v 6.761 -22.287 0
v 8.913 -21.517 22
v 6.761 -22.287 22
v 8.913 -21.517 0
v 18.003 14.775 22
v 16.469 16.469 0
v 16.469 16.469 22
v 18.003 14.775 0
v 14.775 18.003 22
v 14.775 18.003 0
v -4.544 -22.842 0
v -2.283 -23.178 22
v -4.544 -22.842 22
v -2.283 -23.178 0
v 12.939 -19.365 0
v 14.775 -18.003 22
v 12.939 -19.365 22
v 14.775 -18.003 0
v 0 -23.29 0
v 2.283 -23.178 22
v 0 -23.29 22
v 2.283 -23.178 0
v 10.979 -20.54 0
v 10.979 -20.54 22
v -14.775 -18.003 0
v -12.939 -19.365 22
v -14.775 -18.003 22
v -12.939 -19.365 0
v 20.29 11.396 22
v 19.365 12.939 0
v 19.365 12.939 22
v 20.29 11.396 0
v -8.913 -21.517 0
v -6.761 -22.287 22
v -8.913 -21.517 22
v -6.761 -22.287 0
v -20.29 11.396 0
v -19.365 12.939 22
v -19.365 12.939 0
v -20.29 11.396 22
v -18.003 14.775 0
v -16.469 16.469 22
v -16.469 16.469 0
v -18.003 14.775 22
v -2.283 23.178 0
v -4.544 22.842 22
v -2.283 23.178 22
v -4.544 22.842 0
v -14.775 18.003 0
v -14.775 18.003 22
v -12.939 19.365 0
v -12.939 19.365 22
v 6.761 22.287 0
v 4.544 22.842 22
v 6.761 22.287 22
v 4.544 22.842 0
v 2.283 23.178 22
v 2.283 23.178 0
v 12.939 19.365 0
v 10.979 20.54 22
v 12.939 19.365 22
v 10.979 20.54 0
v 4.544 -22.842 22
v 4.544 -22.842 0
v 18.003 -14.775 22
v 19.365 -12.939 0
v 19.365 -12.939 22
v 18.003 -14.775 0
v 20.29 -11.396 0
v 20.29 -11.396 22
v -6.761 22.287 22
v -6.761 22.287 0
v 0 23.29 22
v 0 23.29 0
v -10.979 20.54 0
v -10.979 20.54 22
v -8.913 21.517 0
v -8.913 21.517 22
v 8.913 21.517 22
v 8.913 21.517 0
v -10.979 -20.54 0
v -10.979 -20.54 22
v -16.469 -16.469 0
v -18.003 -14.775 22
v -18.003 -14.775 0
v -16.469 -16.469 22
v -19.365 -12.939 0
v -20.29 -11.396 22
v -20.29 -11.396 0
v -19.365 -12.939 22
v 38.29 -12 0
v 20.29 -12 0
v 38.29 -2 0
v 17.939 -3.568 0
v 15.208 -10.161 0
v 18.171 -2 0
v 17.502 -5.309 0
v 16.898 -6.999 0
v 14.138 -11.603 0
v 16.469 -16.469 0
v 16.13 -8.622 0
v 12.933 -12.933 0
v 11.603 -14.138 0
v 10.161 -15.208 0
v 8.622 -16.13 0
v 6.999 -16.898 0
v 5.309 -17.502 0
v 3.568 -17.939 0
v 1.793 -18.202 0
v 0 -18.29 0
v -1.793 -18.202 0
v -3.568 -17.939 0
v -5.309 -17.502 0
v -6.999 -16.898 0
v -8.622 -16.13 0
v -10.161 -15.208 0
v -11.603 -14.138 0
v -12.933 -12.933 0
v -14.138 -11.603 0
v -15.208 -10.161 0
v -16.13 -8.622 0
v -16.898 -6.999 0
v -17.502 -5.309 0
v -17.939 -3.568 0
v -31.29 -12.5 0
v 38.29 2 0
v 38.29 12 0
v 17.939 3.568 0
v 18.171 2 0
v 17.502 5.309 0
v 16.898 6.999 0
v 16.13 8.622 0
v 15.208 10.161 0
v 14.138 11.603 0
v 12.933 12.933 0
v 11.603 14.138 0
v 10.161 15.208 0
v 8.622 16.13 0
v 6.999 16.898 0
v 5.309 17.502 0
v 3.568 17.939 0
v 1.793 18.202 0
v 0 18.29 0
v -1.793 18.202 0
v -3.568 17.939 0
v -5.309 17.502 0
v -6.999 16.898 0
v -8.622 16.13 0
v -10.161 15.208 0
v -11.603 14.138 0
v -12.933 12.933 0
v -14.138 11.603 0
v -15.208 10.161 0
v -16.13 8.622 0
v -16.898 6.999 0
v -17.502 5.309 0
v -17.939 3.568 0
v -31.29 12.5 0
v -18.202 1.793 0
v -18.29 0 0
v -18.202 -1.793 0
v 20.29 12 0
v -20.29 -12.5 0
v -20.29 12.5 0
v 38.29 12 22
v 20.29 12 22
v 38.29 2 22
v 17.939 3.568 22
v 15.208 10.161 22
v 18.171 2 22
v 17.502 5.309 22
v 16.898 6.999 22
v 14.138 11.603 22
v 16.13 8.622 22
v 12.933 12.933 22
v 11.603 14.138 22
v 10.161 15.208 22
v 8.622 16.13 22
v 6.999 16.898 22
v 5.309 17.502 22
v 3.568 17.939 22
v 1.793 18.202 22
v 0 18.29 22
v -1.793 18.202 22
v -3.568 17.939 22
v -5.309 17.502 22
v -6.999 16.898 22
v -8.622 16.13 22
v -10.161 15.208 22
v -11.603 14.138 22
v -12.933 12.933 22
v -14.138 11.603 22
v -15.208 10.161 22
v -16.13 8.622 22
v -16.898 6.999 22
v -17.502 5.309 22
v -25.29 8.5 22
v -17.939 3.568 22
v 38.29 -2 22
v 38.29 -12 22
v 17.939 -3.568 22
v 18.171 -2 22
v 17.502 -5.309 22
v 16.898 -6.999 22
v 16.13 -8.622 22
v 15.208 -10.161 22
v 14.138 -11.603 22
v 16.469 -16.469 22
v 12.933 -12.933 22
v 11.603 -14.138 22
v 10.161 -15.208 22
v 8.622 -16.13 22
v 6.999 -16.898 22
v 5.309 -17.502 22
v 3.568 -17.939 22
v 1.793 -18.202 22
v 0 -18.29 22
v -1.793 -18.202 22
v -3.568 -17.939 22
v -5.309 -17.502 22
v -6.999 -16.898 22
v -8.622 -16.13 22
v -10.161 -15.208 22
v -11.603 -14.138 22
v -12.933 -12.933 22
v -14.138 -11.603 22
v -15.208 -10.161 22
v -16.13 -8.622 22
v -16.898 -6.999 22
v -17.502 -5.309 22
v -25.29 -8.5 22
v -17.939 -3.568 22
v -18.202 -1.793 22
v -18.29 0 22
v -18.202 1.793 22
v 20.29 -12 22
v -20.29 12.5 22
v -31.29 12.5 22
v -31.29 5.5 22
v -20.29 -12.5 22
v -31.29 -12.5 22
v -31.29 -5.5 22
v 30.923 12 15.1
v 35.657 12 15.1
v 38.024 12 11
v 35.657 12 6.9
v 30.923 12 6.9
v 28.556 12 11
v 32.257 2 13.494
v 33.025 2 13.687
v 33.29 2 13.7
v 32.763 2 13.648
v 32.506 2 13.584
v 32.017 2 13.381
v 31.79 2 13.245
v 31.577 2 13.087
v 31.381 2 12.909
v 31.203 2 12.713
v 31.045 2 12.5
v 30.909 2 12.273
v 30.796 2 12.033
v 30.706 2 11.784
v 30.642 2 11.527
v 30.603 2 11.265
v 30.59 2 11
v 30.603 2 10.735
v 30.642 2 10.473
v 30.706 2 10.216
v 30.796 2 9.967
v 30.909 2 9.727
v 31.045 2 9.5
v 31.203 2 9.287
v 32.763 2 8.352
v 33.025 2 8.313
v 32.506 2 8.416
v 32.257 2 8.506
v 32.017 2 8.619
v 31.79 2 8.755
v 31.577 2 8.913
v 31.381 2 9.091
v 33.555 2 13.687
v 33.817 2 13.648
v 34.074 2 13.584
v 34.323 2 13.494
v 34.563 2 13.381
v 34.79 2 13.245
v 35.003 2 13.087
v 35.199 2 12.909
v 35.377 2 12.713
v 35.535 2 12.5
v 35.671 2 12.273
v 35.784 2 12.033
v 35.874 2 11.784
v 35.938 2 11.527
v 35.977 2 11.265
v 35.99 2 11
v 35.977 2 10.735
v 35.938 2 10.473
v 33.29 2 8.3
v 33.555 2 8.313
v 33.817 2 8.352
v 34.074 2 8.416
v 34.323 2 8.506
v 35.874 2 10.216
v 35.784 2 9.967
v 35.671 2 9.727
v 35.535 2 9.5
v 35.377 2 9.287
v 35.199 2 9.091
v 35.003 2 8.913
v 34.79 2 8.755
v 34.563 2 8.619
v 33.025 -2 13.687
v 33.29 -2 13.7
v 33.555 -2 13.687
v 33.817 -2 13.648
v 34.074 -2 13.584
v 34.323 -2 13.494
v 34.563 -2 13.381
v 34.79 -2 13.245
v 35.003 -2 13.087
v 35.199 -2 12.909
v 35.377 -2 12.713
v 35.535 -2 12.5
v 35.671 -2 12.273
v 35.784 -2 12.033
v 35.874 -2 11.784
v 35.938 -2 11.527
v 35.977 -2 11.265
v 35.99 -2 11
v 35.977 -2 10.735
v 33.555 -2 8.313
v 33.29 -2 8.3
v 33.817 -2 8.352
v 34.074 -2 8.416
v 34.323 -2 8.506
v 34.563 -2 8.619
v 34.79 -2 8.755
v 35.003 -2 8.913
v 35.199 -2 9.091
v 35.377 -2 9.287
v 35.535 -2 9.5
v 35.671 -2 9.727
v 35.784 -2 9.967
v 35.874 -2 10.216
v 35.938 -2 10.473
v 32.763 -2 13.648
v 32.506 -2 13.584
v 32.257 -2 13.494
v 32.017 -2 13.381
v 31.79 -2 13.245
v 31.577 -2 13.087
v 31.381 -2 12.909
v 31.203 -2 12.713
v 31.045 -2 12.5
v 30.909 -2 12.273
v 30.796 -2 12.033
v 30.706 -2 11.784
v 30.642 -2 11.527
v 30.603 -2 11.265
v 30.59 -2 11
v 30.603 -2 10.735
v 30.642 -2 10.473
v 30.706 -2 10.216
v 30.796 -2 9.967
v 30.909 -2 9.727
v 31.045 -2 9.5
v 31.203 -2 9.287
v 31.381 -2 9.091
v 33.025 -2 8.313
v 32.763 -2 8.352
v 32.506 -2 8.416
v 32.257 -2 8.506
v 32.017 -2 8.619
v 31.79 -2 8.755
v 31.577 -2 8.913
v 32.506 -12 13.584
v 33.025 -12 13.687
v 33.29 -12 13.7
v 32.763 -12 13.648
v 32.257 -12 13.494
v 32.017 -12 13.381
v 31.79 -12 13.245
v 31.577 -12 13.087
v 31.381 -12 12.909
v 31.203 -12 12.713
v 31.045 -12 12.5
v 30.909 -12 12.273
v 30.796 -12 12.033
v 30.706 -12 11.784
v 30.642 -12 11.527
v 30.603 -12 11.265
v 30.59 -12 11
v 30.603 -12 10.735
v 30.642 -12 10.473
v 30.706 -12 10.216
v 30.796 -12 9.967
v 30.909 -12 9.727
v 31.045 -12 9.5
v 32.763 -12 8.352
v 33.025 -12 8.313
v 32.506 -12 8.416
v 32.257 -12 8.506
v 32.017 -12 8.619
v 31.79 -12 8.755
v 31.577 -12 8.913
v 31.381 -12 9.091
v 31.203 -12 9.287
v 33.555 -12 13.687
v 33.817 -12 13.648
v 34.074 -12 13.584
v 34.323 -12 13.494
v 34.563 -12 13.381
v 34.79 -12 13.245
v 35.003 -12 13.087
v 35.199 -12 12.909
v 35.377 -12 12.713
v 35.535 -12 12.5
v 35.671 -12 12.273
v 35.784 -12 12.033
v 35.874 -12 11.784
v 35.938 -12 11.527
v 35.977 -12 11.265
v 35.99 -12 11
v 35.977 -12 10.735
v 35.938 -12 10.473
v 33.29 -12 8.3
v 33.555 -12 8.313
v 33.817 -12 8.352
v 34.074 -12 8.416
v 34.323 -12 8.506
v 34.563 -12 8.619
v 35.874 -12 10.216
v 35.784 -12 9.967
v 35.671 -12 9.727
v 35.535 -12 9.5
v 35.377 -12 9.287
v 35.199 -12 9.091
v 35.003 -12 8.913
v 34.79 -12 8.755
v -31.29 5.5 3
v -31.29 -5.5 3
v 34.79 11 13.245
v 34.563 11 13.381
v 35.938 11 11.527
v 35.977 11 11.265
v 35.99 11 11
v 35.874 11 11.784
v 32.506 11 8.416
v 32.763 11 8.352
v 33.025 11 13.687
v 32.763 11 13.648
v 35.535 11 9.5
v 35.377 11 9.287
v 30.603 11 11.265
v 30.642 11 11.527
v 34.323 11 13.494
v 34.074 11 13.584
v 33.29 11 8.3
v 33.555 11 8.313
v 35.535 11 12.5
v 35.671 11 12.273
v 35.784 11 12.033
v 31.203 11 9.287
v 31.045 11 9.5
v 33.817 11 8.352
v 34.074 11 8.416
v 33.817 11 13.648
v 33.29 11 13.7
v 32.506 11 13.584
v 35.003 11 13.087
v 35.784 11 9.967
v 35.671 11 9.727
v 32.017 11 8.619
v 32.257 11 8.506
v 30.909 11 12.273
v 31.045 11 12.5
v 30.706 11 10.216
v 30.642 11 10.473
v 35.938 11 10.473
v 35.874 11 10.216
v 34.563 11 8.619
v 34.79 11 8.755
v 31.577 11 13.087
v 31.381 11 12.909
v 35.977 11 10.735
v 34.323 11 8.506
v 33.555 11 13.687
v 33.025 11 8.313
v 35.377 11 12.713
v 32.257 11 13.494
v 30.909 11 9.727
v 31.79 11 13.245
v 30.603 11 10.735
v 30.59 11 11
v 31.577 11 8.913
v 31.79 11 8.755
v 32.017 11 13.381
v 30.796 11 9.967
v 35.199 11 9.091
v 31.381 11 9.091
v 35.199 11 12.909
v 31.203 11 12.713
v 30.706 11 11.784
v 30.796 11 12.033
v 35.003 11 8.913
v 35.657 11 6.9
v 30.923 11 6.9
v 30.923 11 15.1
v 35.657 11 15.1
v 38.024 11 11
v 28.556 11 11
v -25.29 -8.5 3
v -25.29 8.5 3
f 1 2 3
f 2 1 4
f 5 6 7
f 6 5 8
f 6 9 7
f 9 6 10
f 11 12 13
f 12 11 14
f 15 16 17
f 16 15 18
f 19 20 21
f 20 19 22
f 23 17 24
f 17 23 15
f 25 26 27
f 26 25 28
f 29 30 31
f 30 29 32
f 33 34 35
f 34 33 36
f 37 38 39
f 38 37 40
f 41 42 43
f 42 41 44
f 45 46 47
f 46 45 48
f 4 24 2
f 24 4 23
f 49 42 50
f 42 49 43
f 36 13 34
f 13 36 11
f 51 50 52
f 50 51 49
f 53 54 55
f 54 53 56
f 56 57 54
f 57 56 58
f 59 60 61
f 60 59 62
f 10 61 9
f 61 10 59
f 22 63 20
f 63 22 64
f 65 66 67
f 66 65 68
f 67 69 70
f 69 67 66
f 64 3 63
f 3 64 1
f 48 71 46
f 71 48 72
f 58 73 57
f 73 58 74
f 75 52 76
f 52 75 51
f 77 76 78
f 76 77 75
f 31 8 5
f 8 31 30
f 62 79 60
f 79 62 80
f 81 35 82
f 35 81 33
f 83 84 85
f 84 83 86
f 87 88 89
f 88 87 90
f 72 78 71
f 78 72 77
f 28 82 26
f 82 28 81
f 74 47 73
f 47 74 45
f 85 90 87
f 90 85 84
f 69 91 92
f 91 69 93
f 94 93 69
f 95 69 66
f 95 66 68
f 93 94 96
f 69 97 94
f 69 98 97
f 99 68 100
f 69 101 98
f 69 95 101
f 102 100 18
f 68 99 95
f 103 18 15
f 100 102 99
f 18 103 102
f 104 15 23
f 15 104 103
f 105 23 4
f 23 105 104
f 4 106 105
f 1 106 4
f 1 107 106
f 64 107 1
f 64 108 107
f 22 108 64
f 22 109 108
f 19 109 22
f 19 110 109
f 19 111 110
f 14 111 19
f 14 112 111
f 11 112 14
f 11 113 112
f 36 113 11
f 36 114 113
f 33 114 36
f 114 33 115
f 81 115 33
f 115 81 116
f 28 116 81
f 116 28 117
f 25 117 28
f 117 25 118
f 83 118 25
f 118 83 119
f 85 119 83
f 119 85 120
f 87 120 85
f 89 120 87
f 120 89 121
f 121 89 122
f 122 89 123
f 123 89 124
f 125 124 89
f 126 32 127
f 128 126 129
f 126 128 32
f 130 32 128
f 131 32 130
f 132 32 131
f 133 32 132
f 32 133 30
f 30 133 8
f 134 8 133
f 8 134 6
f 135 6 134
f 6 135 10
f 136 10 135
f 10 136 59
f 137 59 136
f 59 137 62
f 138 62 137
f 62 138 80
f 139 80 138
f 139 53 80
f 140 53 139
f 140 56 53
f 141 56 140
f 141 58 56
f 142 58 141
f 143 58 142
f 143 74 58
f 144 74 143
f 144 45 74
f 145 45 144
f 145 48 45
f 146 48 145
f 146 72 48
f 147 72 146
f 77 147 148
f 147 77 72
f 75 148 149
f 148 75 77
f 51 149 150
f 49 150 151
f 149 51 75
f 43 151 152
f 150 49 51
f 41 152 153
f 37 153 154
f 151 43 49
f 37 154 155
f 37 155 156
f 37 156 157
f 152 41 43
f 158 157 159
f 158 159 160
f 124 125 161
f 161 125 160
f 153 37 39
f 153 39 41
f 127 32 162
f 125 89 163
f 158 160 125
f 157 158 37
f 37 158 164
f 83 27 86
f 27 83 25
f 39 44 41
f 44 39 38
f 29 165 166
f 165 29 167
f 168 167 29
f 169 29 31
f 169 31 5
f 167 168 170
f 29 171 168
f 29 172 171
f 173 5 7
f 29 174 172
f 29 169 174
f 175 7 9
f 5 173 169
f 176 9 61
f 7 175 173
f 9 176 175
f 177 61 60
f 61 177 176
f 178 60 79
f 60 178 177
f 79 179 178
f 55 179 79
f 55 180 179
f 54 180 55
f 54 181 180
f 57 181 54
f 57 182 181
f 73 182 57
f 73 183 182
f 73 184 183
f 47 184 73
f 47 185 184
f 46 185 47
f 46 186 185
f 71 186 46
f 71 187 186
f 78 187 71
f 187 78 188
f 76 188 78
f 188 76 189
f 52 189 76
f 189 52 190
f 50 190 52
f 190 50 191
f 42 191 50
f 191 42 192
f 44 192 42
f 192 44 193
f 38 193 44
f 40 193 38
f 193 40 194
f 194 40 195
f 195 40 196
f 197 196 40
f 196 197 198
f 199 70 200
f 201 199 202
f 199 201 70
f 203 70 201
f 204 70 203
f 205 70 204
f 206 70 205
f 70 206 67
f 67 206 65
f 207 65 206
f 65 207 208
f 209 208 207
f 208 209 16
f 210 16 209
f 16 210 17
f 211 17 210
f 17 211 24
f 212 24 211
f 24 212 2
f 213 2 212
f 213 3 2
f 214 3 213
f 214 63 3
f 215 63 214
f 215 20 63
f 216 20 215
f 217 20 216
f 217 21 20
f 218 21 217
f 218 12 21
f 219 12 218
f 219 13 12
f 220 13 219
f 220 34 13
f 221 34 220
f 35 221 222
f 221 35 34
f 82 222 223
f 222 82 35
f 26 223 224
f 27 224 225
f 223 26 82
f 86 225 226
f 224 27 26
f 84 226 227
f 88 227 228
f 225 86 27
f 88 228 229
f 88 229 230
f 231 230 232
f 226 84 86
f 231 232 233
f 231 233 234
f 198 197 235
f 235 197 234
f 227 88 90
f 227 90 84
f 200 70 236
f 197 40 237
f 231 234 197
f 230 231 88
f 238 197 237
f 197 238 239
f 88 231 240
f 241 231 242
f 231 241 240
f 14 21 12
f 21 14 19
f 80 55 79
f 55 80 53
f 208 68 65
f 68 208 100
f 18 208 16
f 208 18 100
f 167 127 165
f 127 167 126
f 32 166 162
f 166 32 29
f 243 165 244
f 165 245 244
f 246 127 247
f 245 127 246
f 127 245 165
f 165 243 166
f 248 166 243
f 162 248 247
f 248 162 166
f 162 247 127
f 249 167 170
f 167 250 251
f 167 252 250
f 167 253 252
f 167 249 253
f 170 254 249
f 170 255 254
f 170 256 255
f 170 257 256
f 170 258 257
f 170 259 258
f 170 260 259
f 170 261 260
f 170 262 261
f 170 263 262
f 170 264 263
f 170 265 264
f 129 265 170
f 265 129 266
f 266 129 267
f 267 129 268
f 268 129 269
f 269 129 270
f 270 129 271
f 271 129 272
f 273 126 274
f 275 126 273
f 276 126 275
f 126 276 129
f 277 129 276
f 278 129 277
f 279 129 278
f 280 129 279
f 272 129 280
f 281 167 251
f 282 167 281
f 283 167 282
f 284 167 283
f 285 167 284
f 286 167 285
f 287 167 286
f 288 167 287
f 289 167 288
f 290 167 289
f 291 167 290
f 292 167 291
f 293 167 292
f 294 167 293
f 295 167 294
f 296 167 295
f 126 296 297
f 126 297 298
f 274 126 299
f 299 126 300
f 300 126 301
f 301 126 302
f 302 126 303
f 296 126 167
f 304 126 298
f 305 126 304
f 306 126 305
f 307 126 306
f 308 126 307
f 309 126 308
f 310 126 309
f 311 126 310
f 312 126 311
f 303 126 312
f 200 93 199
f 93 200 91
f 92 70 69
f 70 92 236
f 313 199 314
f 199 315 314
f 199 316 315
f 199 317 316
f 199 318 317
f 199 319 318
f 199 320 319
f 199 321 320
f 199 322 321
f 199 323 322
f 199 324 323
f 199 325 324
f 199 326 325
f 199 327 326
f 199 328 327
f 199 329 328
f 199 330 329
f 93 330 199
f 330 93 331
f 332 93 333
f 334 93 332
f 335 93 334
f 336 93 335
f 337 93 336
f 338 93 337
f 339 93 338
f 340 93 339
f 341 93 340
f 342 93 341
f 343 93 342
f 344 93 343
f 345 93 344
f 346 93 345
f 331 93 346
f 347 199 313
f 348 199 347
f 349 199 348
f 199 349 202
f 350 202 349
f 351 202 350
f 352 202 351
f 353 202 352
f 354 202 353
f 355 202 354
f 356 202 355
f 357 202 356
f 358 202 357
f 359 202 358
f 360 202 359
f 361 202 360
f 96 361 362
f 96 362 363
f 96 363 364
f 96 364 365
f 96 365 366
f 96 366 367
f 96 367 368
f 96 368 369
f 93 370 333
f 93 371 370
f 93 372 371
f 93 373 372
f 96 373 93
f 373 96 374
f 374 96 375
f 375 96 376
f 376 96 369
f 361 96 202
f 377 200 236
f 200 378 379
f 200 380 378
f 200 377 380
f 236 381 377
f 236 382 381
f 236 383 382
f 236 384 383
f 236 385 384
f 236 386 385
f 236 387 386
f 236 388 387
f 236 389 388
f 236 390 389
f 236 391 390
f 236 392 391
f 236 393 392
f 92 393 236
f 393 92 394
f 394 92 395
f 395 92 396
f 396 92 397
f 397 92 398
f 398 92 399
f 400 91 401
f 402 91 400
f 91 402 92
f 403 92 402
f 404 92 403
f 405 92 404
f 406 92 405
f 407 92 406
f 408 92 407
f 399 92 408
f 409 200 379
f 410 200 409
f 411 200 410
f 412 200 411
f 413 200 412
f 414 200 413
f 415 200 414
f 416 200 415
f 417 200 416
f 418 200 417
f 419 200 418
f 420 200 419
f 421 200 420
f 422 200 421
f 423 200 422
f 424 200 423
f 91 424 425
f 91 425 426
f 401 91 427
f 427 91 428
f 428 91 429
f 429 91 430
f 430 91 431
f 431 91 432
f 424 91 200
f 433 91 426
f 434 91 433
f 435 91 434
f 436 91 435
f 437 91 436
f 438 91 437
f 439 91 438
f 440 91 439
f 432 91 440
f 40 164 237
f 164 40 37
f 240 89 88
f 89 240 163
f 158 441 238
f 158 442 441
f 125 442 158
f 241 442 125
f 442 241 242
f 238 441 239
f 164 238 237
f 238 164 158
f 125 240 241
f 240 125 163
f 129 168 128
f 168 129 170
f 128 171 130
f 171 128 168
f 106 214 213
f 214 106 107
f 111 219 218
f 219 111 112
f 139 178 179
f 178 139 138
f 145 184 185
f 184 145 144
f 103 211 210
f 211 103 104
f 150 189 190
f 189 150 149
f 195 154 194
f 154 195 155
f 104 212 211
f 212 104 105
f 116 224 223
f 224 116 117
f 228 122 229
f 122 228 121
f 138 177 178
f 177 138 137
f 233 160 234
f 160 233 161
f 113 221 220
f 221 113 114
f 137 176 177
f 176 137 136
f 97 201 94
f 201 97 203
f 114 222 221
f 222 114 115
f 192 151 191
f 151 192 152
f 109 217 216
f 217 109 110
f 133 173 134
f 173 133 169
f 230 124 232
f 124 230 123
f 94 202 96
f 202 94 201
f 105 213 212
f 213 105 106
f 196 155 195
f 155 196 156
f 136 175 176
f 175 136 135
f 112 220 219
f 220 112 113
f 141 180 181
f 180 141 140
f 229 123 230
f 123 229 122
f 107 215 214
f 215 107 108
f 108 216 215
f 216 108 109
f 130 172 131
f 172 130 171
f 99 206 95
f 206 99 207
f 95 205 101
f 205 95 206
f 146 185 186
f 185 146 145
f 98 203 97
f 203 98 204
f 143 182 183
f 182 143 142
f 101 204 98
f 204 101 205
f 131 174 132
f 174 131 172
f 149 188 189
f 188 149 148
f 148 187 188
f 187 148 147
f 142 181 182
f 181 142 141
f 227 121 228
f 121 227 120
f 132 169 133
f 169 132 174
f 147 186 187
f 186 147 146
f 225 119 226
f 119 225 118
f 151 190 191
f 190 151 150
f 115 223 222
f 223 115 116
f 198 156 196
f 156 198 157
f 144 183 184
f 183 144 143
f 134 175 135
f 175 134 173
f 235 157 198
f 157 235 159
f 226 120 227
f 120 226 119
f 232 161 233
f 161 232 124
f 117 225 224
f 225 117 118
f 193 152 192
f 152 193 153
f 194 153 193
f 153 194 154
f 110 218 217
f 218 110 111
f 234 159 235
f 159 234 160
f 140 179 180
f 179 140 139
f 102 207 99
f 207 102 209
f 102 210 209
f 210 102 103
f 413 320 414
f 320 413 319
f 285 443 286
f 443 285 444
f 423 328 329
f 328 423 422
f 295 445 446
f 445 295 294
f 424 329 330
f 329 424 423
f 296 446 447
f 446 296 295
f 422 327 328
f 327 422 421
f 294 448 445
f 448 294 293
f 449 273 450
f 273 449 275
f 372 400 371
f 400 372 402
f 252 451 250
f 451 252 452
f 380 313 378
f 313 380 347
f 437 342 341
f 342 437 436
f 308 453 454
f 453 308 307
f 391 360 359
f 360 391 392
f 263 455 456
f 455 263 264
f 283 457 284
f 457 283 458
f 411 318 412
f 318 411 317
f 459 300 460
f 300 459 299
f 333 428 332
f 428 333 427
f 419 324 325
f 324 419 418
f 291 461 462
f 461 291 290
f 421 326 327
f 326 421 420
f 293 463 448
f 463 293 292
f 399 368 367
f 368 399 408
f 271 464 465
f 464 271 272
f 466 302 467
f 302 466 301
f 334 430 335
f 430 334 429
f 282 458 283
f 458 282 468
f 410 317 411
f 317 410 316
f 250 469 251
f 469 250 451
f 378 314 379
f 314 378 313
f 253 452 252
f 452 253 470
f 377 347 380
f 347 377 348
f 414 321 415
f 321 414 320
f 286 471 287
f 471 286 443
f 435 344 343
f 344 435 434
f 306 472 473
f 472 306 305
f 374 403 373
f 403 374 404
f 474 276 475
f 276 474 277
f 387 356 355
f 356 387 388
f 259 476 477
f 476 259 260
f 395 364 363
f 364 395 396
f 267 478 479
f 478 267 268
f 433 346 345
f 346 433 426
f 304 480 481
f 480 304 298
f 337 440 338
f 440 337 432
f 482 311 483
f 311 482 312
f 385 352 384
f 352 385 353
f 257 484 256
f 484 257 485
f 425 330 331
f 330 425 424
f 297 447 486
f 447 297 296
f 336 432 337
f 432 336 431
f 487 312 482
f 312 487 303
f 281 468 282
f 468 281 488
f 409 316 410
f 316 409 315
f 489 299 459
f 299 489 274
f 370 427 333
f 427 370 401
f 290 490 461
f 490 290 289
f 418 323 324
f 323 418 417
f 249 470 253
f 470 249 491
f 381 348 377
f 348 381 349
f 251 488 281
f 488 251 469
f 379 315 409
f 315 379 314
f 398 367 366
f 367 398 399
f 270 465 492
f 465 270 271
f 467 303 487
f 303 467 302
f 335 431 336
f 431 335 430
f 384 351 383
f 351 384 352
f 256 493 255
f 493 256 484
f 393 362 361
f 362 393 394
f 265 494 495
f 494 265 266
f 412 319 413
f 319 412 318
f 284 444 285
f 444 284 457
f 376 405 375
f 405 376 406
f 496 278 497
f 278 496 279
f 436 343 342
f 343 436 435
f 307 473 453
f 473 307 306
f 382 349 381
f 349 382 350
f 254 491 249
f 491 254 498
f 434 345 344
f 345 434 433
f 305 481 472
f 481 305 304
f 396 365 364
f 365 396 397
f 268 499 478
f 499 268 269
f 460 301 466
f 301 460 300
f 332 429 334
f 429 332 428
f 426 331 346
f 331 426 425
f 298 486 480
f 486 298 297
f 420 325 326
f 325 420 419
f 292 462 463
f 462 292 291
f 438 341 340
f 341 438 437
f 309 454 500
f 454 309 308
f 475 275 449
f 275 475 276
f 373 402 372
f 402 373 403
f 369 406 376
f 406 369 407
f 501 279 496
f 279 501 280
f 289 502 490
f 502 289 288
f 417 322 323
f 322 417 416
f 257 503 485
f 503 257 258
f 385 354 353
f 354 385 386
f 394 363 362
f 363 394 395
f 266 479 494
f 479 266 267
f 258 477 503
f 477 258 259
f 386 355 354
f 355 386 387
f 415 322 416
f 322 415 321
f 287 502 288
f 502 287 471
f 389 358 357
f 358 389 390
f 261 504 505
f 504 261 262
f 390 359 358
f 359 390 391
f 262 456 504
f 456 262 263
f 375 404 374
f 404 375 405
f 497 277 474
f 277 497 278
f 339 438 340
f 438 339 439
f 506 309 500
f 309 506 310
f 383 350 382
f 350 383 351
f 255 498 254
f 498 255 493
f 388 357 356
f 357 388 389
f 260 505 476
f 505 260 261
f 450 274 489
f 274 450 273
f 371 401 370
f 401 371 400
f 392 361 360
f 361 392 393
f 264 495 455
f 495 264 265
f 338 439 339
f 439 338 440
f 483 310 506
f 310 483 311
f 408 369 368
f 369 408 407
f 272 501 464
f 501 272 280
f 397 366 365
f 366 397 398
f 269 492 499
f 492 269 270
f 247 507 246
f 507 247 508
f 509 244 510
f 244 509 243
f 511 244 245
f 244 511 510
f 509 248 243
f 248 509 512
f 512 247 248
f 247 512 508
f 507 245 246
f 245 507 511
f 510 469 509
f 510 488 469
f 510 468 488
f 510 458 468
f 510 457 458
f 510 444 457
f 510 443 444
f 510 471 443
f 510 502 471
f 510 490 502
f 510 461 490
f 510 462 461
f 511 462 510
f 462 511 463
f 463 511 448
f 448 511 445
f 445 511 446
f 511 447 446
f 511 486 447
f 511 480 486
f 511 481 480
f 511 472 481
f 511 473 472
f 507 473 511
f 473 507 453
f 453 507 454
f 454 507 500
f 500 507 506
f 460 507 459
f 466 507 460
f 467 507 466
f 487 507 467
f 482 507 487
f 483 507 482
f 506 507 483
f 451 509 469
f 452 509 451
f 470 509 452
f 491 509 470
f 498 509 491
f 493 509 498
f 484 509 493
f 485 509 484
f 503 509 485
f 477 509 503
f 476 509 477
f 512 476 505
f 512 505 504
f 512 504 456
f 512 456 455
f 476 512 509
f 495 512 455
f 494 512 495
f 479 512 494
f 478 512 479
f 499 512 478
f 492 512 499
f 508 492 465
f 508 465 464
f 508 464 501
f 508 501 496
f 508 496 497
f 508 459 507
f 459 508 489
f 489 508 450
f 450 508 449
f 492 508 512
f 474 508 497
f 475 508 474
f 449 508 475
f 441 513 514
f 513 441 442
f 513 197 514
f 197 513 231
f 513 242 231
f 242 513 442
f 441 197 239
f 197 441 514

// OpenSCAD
// file: stand_cable_clamp_common.scad
// stand_cable_clamp_common.scad — modular cable clamp for round stand poles.
//
// A split C-clamp pops over the pole and an M5 bolt + wingnut cinches it tight
// (the bolt head is captured in a hex pocket, so you only turn the wingnut —
// tool-free reposition). A dovetail on the clamp face takes slide-on cable
// heads, so one clamp accepts any attachment.
//
//   clamp(tube_d)   — the pole clamp (set tube_d to your pole OD)
//   head_hook()     — open J-hook
//   head_clip()     — snap cable clip
//   head_comb()     — multi-cable comb
//   head_velcro()   — velcro-strap slot
//
// On-Stage SS8800B+ measured diameters: upper shaft ≈ 34.9 mm (1⅜") / 38.1 mm
// (1½" w/ sleeve), tripod legs 35.38 mm, crank-up column 41.41 mm. Variant files
// clamp_leg.scad (35.38) and clamp_column.scad (41.41) cover the latter two.

TUBE_D = 35;        // pole outer diameter (set per stand)
CLEAR  = 0.6;       // clamp bore clearance
WALL   = 5;         // clamp wall
H      = 22;        // clamp height (along the pole)
GAP    = 4;         // split-gap width
EAR_L  = 18; EAR_W = 10;
BOLT_D = 5.4;       // M5 clearance
HEX_AF = 8.2;       // M5 hex head/nut across-flats (capture pocket)
HEX_T  = 4.5;

// dovetail (undercut: mouth narrower than back so the head can't pull out)
DT_MOUTH = 11; DT_BACK = 17; DT_DEPTH = 6; DT_H = 18; DT_STOP = 3; DT_CLEAR = 0.5;
CABLE_D = 8;        // nominal cable diameter for clip/comb

$fn = 64;

// dovetail solid: mouth (narrow) at x=0 facing -X, widening to back at x=depth, extruded up Z
module dt_prism(mouth, back, depth, h) {
    linear_extrude(h) polygon([[0, -mouth/2], [0, mouth/2], [depth, back/2], [depth, -back/2]]);
}
module dt_tongue() { dt_prism(DT_MOUTH - DT_CLEAR, DT_BACK - DT_CLEAR, DT_DEPTH - 0.3, DT_H); }

// ---- clamp ----
module clamp(tube_d = TUBE_D) {
    ir = tube_d / 2 + CLEAR; orr = ir + WALL;
    boss_x = -orr - DT_DEPTH - 2;        // -X outer face of the dovetail boss
    difference() {
        union() {
            cylinder(h = H, r = orr);
            translate([orr - 3, GAP / 2, 0]) cube([EAR_L, EAR_W, H]);            // +Y ear
            translate([orr - 3, -GAP / 2 - EAR_W, 0]) cube([EAR_L, EAR_W, H]);   // -Y ear
            translate([boss_x, -(DT_BACK / 2 + 4), 0]) cube([DT_DEPTH + 5, DT_BACK + 8, H]); // dovetail boss
        }
        translate([0, 0, 0]) cylinder(h = 3 * H, r = ir, center = true);         // bore
        translate([0, -GAP / 2, -1]) cube([orr + EAR_L + 5, GAP, H + 2]);        // split slot
        // wingnut bolt through the ears (along Y)
        translate([orr + EAR_L - 8, GAP / 2 + EAR_W + 3, H / 2]) rotate([90, 0, 0]) cylinder(h = 2 * EAR_W + GAP + 8, d = BOLT_D);
        // hex pocket captures the bolt head on the +Y ear outer face
        translate([orr + EAR_L - 8, GAP / 2 + EAR_W + HEX_T, H / 2]) rotate([90, 0, 0]) cylinder(h = HEX_T + 1, d = HEX_AF / cos(30), $fn = 6);
        // dovetail socket groove (open top, solid below DT_STOP as a slide stop)
        translate([boss_x, 0, DT_STOP]) dt_prism(DT_MOUTH, DT_BACK, DT_DEPTH, H);
    }
}

// ---- heads (universal; mount via the dovetail tongue at x=0..DT_DEPTH) ----
module _backplate(t = 4) { translate([-t, -DT_BACK / 2, 0]) cube([t, DT_BACK, DT_H]); }

module head_hook() {
    dt_tongue(); _backplate();
    translate([-4, 0, DT_H / 2]) rotate([90, 0, 0])
        rotate_extrude(angle = 250) translate([16, 0]) circle(d = 7);
}
module head_clip(clip_w = 12) {
    dt_tongue(); _backplate();
    // C-clip (vertical cable), ring connects to the backplate on +X, mouth opens -X
    ring_out = CABLE_D + 5;
    translate([-4 - ring_out / 2 + 1.5, 0, (DT_H - clip_w) / 2])
        linear_extrude(clip_w) difference() {
            circle(d = ring_out);
            circle(d = CABLE_D + 0.7);
            translate([-ring_out, -(CABLE_D - 1.5) / 2]) square([ring_out, CABLE_D - 1.5]); // snap mouth (-X)
        }
}
module head_comb(n = 4) {
    dt_tongue(); _backplate();
    bar_w = n * (CABLE_D + 3) + 3;
    translate([-4 - 8, -bar_w / 2, 0]) difference() {
        cube([10, bar_w, DT_H]);
        for (i = [0 : n - 1]) translate([-1, 3 + i * (CABLE_D + 3) + CABLE_D / 2, DT_H]) rotate([0, 90, 0]) cylinder(d = CABLE_D, h = 12); // open-top slots
        for (i = [0 : n - 1]) translate([-1, 3 + i * (CABLE_D + 3) + CABLE_D / 2, DT_H - CABLE_D / 2]) cube([12, CABLE_D, CABLE_D]);
    }
}
module head_velcro(strap_w = 25, strap_t = 3) {
    dt_tongue(); _backplate();
    translate([-4 - 6, -(strap_w + 8) / 2, 0]) difference() {
        cube([6, strap_w + 8, DT_H]);
        translate([-1, 4, DT_H / 2 - strap_t / 2]) cube([8, strap_w, strap_t]); // strap thru-slot
    }
}
// main file
// clamp_leg — On-Stage SS8800B+ tripod leg (OD 35.38 mm).
include <stand_cable_clamp_common.scad>
clamp(tube_d = 35.38);
